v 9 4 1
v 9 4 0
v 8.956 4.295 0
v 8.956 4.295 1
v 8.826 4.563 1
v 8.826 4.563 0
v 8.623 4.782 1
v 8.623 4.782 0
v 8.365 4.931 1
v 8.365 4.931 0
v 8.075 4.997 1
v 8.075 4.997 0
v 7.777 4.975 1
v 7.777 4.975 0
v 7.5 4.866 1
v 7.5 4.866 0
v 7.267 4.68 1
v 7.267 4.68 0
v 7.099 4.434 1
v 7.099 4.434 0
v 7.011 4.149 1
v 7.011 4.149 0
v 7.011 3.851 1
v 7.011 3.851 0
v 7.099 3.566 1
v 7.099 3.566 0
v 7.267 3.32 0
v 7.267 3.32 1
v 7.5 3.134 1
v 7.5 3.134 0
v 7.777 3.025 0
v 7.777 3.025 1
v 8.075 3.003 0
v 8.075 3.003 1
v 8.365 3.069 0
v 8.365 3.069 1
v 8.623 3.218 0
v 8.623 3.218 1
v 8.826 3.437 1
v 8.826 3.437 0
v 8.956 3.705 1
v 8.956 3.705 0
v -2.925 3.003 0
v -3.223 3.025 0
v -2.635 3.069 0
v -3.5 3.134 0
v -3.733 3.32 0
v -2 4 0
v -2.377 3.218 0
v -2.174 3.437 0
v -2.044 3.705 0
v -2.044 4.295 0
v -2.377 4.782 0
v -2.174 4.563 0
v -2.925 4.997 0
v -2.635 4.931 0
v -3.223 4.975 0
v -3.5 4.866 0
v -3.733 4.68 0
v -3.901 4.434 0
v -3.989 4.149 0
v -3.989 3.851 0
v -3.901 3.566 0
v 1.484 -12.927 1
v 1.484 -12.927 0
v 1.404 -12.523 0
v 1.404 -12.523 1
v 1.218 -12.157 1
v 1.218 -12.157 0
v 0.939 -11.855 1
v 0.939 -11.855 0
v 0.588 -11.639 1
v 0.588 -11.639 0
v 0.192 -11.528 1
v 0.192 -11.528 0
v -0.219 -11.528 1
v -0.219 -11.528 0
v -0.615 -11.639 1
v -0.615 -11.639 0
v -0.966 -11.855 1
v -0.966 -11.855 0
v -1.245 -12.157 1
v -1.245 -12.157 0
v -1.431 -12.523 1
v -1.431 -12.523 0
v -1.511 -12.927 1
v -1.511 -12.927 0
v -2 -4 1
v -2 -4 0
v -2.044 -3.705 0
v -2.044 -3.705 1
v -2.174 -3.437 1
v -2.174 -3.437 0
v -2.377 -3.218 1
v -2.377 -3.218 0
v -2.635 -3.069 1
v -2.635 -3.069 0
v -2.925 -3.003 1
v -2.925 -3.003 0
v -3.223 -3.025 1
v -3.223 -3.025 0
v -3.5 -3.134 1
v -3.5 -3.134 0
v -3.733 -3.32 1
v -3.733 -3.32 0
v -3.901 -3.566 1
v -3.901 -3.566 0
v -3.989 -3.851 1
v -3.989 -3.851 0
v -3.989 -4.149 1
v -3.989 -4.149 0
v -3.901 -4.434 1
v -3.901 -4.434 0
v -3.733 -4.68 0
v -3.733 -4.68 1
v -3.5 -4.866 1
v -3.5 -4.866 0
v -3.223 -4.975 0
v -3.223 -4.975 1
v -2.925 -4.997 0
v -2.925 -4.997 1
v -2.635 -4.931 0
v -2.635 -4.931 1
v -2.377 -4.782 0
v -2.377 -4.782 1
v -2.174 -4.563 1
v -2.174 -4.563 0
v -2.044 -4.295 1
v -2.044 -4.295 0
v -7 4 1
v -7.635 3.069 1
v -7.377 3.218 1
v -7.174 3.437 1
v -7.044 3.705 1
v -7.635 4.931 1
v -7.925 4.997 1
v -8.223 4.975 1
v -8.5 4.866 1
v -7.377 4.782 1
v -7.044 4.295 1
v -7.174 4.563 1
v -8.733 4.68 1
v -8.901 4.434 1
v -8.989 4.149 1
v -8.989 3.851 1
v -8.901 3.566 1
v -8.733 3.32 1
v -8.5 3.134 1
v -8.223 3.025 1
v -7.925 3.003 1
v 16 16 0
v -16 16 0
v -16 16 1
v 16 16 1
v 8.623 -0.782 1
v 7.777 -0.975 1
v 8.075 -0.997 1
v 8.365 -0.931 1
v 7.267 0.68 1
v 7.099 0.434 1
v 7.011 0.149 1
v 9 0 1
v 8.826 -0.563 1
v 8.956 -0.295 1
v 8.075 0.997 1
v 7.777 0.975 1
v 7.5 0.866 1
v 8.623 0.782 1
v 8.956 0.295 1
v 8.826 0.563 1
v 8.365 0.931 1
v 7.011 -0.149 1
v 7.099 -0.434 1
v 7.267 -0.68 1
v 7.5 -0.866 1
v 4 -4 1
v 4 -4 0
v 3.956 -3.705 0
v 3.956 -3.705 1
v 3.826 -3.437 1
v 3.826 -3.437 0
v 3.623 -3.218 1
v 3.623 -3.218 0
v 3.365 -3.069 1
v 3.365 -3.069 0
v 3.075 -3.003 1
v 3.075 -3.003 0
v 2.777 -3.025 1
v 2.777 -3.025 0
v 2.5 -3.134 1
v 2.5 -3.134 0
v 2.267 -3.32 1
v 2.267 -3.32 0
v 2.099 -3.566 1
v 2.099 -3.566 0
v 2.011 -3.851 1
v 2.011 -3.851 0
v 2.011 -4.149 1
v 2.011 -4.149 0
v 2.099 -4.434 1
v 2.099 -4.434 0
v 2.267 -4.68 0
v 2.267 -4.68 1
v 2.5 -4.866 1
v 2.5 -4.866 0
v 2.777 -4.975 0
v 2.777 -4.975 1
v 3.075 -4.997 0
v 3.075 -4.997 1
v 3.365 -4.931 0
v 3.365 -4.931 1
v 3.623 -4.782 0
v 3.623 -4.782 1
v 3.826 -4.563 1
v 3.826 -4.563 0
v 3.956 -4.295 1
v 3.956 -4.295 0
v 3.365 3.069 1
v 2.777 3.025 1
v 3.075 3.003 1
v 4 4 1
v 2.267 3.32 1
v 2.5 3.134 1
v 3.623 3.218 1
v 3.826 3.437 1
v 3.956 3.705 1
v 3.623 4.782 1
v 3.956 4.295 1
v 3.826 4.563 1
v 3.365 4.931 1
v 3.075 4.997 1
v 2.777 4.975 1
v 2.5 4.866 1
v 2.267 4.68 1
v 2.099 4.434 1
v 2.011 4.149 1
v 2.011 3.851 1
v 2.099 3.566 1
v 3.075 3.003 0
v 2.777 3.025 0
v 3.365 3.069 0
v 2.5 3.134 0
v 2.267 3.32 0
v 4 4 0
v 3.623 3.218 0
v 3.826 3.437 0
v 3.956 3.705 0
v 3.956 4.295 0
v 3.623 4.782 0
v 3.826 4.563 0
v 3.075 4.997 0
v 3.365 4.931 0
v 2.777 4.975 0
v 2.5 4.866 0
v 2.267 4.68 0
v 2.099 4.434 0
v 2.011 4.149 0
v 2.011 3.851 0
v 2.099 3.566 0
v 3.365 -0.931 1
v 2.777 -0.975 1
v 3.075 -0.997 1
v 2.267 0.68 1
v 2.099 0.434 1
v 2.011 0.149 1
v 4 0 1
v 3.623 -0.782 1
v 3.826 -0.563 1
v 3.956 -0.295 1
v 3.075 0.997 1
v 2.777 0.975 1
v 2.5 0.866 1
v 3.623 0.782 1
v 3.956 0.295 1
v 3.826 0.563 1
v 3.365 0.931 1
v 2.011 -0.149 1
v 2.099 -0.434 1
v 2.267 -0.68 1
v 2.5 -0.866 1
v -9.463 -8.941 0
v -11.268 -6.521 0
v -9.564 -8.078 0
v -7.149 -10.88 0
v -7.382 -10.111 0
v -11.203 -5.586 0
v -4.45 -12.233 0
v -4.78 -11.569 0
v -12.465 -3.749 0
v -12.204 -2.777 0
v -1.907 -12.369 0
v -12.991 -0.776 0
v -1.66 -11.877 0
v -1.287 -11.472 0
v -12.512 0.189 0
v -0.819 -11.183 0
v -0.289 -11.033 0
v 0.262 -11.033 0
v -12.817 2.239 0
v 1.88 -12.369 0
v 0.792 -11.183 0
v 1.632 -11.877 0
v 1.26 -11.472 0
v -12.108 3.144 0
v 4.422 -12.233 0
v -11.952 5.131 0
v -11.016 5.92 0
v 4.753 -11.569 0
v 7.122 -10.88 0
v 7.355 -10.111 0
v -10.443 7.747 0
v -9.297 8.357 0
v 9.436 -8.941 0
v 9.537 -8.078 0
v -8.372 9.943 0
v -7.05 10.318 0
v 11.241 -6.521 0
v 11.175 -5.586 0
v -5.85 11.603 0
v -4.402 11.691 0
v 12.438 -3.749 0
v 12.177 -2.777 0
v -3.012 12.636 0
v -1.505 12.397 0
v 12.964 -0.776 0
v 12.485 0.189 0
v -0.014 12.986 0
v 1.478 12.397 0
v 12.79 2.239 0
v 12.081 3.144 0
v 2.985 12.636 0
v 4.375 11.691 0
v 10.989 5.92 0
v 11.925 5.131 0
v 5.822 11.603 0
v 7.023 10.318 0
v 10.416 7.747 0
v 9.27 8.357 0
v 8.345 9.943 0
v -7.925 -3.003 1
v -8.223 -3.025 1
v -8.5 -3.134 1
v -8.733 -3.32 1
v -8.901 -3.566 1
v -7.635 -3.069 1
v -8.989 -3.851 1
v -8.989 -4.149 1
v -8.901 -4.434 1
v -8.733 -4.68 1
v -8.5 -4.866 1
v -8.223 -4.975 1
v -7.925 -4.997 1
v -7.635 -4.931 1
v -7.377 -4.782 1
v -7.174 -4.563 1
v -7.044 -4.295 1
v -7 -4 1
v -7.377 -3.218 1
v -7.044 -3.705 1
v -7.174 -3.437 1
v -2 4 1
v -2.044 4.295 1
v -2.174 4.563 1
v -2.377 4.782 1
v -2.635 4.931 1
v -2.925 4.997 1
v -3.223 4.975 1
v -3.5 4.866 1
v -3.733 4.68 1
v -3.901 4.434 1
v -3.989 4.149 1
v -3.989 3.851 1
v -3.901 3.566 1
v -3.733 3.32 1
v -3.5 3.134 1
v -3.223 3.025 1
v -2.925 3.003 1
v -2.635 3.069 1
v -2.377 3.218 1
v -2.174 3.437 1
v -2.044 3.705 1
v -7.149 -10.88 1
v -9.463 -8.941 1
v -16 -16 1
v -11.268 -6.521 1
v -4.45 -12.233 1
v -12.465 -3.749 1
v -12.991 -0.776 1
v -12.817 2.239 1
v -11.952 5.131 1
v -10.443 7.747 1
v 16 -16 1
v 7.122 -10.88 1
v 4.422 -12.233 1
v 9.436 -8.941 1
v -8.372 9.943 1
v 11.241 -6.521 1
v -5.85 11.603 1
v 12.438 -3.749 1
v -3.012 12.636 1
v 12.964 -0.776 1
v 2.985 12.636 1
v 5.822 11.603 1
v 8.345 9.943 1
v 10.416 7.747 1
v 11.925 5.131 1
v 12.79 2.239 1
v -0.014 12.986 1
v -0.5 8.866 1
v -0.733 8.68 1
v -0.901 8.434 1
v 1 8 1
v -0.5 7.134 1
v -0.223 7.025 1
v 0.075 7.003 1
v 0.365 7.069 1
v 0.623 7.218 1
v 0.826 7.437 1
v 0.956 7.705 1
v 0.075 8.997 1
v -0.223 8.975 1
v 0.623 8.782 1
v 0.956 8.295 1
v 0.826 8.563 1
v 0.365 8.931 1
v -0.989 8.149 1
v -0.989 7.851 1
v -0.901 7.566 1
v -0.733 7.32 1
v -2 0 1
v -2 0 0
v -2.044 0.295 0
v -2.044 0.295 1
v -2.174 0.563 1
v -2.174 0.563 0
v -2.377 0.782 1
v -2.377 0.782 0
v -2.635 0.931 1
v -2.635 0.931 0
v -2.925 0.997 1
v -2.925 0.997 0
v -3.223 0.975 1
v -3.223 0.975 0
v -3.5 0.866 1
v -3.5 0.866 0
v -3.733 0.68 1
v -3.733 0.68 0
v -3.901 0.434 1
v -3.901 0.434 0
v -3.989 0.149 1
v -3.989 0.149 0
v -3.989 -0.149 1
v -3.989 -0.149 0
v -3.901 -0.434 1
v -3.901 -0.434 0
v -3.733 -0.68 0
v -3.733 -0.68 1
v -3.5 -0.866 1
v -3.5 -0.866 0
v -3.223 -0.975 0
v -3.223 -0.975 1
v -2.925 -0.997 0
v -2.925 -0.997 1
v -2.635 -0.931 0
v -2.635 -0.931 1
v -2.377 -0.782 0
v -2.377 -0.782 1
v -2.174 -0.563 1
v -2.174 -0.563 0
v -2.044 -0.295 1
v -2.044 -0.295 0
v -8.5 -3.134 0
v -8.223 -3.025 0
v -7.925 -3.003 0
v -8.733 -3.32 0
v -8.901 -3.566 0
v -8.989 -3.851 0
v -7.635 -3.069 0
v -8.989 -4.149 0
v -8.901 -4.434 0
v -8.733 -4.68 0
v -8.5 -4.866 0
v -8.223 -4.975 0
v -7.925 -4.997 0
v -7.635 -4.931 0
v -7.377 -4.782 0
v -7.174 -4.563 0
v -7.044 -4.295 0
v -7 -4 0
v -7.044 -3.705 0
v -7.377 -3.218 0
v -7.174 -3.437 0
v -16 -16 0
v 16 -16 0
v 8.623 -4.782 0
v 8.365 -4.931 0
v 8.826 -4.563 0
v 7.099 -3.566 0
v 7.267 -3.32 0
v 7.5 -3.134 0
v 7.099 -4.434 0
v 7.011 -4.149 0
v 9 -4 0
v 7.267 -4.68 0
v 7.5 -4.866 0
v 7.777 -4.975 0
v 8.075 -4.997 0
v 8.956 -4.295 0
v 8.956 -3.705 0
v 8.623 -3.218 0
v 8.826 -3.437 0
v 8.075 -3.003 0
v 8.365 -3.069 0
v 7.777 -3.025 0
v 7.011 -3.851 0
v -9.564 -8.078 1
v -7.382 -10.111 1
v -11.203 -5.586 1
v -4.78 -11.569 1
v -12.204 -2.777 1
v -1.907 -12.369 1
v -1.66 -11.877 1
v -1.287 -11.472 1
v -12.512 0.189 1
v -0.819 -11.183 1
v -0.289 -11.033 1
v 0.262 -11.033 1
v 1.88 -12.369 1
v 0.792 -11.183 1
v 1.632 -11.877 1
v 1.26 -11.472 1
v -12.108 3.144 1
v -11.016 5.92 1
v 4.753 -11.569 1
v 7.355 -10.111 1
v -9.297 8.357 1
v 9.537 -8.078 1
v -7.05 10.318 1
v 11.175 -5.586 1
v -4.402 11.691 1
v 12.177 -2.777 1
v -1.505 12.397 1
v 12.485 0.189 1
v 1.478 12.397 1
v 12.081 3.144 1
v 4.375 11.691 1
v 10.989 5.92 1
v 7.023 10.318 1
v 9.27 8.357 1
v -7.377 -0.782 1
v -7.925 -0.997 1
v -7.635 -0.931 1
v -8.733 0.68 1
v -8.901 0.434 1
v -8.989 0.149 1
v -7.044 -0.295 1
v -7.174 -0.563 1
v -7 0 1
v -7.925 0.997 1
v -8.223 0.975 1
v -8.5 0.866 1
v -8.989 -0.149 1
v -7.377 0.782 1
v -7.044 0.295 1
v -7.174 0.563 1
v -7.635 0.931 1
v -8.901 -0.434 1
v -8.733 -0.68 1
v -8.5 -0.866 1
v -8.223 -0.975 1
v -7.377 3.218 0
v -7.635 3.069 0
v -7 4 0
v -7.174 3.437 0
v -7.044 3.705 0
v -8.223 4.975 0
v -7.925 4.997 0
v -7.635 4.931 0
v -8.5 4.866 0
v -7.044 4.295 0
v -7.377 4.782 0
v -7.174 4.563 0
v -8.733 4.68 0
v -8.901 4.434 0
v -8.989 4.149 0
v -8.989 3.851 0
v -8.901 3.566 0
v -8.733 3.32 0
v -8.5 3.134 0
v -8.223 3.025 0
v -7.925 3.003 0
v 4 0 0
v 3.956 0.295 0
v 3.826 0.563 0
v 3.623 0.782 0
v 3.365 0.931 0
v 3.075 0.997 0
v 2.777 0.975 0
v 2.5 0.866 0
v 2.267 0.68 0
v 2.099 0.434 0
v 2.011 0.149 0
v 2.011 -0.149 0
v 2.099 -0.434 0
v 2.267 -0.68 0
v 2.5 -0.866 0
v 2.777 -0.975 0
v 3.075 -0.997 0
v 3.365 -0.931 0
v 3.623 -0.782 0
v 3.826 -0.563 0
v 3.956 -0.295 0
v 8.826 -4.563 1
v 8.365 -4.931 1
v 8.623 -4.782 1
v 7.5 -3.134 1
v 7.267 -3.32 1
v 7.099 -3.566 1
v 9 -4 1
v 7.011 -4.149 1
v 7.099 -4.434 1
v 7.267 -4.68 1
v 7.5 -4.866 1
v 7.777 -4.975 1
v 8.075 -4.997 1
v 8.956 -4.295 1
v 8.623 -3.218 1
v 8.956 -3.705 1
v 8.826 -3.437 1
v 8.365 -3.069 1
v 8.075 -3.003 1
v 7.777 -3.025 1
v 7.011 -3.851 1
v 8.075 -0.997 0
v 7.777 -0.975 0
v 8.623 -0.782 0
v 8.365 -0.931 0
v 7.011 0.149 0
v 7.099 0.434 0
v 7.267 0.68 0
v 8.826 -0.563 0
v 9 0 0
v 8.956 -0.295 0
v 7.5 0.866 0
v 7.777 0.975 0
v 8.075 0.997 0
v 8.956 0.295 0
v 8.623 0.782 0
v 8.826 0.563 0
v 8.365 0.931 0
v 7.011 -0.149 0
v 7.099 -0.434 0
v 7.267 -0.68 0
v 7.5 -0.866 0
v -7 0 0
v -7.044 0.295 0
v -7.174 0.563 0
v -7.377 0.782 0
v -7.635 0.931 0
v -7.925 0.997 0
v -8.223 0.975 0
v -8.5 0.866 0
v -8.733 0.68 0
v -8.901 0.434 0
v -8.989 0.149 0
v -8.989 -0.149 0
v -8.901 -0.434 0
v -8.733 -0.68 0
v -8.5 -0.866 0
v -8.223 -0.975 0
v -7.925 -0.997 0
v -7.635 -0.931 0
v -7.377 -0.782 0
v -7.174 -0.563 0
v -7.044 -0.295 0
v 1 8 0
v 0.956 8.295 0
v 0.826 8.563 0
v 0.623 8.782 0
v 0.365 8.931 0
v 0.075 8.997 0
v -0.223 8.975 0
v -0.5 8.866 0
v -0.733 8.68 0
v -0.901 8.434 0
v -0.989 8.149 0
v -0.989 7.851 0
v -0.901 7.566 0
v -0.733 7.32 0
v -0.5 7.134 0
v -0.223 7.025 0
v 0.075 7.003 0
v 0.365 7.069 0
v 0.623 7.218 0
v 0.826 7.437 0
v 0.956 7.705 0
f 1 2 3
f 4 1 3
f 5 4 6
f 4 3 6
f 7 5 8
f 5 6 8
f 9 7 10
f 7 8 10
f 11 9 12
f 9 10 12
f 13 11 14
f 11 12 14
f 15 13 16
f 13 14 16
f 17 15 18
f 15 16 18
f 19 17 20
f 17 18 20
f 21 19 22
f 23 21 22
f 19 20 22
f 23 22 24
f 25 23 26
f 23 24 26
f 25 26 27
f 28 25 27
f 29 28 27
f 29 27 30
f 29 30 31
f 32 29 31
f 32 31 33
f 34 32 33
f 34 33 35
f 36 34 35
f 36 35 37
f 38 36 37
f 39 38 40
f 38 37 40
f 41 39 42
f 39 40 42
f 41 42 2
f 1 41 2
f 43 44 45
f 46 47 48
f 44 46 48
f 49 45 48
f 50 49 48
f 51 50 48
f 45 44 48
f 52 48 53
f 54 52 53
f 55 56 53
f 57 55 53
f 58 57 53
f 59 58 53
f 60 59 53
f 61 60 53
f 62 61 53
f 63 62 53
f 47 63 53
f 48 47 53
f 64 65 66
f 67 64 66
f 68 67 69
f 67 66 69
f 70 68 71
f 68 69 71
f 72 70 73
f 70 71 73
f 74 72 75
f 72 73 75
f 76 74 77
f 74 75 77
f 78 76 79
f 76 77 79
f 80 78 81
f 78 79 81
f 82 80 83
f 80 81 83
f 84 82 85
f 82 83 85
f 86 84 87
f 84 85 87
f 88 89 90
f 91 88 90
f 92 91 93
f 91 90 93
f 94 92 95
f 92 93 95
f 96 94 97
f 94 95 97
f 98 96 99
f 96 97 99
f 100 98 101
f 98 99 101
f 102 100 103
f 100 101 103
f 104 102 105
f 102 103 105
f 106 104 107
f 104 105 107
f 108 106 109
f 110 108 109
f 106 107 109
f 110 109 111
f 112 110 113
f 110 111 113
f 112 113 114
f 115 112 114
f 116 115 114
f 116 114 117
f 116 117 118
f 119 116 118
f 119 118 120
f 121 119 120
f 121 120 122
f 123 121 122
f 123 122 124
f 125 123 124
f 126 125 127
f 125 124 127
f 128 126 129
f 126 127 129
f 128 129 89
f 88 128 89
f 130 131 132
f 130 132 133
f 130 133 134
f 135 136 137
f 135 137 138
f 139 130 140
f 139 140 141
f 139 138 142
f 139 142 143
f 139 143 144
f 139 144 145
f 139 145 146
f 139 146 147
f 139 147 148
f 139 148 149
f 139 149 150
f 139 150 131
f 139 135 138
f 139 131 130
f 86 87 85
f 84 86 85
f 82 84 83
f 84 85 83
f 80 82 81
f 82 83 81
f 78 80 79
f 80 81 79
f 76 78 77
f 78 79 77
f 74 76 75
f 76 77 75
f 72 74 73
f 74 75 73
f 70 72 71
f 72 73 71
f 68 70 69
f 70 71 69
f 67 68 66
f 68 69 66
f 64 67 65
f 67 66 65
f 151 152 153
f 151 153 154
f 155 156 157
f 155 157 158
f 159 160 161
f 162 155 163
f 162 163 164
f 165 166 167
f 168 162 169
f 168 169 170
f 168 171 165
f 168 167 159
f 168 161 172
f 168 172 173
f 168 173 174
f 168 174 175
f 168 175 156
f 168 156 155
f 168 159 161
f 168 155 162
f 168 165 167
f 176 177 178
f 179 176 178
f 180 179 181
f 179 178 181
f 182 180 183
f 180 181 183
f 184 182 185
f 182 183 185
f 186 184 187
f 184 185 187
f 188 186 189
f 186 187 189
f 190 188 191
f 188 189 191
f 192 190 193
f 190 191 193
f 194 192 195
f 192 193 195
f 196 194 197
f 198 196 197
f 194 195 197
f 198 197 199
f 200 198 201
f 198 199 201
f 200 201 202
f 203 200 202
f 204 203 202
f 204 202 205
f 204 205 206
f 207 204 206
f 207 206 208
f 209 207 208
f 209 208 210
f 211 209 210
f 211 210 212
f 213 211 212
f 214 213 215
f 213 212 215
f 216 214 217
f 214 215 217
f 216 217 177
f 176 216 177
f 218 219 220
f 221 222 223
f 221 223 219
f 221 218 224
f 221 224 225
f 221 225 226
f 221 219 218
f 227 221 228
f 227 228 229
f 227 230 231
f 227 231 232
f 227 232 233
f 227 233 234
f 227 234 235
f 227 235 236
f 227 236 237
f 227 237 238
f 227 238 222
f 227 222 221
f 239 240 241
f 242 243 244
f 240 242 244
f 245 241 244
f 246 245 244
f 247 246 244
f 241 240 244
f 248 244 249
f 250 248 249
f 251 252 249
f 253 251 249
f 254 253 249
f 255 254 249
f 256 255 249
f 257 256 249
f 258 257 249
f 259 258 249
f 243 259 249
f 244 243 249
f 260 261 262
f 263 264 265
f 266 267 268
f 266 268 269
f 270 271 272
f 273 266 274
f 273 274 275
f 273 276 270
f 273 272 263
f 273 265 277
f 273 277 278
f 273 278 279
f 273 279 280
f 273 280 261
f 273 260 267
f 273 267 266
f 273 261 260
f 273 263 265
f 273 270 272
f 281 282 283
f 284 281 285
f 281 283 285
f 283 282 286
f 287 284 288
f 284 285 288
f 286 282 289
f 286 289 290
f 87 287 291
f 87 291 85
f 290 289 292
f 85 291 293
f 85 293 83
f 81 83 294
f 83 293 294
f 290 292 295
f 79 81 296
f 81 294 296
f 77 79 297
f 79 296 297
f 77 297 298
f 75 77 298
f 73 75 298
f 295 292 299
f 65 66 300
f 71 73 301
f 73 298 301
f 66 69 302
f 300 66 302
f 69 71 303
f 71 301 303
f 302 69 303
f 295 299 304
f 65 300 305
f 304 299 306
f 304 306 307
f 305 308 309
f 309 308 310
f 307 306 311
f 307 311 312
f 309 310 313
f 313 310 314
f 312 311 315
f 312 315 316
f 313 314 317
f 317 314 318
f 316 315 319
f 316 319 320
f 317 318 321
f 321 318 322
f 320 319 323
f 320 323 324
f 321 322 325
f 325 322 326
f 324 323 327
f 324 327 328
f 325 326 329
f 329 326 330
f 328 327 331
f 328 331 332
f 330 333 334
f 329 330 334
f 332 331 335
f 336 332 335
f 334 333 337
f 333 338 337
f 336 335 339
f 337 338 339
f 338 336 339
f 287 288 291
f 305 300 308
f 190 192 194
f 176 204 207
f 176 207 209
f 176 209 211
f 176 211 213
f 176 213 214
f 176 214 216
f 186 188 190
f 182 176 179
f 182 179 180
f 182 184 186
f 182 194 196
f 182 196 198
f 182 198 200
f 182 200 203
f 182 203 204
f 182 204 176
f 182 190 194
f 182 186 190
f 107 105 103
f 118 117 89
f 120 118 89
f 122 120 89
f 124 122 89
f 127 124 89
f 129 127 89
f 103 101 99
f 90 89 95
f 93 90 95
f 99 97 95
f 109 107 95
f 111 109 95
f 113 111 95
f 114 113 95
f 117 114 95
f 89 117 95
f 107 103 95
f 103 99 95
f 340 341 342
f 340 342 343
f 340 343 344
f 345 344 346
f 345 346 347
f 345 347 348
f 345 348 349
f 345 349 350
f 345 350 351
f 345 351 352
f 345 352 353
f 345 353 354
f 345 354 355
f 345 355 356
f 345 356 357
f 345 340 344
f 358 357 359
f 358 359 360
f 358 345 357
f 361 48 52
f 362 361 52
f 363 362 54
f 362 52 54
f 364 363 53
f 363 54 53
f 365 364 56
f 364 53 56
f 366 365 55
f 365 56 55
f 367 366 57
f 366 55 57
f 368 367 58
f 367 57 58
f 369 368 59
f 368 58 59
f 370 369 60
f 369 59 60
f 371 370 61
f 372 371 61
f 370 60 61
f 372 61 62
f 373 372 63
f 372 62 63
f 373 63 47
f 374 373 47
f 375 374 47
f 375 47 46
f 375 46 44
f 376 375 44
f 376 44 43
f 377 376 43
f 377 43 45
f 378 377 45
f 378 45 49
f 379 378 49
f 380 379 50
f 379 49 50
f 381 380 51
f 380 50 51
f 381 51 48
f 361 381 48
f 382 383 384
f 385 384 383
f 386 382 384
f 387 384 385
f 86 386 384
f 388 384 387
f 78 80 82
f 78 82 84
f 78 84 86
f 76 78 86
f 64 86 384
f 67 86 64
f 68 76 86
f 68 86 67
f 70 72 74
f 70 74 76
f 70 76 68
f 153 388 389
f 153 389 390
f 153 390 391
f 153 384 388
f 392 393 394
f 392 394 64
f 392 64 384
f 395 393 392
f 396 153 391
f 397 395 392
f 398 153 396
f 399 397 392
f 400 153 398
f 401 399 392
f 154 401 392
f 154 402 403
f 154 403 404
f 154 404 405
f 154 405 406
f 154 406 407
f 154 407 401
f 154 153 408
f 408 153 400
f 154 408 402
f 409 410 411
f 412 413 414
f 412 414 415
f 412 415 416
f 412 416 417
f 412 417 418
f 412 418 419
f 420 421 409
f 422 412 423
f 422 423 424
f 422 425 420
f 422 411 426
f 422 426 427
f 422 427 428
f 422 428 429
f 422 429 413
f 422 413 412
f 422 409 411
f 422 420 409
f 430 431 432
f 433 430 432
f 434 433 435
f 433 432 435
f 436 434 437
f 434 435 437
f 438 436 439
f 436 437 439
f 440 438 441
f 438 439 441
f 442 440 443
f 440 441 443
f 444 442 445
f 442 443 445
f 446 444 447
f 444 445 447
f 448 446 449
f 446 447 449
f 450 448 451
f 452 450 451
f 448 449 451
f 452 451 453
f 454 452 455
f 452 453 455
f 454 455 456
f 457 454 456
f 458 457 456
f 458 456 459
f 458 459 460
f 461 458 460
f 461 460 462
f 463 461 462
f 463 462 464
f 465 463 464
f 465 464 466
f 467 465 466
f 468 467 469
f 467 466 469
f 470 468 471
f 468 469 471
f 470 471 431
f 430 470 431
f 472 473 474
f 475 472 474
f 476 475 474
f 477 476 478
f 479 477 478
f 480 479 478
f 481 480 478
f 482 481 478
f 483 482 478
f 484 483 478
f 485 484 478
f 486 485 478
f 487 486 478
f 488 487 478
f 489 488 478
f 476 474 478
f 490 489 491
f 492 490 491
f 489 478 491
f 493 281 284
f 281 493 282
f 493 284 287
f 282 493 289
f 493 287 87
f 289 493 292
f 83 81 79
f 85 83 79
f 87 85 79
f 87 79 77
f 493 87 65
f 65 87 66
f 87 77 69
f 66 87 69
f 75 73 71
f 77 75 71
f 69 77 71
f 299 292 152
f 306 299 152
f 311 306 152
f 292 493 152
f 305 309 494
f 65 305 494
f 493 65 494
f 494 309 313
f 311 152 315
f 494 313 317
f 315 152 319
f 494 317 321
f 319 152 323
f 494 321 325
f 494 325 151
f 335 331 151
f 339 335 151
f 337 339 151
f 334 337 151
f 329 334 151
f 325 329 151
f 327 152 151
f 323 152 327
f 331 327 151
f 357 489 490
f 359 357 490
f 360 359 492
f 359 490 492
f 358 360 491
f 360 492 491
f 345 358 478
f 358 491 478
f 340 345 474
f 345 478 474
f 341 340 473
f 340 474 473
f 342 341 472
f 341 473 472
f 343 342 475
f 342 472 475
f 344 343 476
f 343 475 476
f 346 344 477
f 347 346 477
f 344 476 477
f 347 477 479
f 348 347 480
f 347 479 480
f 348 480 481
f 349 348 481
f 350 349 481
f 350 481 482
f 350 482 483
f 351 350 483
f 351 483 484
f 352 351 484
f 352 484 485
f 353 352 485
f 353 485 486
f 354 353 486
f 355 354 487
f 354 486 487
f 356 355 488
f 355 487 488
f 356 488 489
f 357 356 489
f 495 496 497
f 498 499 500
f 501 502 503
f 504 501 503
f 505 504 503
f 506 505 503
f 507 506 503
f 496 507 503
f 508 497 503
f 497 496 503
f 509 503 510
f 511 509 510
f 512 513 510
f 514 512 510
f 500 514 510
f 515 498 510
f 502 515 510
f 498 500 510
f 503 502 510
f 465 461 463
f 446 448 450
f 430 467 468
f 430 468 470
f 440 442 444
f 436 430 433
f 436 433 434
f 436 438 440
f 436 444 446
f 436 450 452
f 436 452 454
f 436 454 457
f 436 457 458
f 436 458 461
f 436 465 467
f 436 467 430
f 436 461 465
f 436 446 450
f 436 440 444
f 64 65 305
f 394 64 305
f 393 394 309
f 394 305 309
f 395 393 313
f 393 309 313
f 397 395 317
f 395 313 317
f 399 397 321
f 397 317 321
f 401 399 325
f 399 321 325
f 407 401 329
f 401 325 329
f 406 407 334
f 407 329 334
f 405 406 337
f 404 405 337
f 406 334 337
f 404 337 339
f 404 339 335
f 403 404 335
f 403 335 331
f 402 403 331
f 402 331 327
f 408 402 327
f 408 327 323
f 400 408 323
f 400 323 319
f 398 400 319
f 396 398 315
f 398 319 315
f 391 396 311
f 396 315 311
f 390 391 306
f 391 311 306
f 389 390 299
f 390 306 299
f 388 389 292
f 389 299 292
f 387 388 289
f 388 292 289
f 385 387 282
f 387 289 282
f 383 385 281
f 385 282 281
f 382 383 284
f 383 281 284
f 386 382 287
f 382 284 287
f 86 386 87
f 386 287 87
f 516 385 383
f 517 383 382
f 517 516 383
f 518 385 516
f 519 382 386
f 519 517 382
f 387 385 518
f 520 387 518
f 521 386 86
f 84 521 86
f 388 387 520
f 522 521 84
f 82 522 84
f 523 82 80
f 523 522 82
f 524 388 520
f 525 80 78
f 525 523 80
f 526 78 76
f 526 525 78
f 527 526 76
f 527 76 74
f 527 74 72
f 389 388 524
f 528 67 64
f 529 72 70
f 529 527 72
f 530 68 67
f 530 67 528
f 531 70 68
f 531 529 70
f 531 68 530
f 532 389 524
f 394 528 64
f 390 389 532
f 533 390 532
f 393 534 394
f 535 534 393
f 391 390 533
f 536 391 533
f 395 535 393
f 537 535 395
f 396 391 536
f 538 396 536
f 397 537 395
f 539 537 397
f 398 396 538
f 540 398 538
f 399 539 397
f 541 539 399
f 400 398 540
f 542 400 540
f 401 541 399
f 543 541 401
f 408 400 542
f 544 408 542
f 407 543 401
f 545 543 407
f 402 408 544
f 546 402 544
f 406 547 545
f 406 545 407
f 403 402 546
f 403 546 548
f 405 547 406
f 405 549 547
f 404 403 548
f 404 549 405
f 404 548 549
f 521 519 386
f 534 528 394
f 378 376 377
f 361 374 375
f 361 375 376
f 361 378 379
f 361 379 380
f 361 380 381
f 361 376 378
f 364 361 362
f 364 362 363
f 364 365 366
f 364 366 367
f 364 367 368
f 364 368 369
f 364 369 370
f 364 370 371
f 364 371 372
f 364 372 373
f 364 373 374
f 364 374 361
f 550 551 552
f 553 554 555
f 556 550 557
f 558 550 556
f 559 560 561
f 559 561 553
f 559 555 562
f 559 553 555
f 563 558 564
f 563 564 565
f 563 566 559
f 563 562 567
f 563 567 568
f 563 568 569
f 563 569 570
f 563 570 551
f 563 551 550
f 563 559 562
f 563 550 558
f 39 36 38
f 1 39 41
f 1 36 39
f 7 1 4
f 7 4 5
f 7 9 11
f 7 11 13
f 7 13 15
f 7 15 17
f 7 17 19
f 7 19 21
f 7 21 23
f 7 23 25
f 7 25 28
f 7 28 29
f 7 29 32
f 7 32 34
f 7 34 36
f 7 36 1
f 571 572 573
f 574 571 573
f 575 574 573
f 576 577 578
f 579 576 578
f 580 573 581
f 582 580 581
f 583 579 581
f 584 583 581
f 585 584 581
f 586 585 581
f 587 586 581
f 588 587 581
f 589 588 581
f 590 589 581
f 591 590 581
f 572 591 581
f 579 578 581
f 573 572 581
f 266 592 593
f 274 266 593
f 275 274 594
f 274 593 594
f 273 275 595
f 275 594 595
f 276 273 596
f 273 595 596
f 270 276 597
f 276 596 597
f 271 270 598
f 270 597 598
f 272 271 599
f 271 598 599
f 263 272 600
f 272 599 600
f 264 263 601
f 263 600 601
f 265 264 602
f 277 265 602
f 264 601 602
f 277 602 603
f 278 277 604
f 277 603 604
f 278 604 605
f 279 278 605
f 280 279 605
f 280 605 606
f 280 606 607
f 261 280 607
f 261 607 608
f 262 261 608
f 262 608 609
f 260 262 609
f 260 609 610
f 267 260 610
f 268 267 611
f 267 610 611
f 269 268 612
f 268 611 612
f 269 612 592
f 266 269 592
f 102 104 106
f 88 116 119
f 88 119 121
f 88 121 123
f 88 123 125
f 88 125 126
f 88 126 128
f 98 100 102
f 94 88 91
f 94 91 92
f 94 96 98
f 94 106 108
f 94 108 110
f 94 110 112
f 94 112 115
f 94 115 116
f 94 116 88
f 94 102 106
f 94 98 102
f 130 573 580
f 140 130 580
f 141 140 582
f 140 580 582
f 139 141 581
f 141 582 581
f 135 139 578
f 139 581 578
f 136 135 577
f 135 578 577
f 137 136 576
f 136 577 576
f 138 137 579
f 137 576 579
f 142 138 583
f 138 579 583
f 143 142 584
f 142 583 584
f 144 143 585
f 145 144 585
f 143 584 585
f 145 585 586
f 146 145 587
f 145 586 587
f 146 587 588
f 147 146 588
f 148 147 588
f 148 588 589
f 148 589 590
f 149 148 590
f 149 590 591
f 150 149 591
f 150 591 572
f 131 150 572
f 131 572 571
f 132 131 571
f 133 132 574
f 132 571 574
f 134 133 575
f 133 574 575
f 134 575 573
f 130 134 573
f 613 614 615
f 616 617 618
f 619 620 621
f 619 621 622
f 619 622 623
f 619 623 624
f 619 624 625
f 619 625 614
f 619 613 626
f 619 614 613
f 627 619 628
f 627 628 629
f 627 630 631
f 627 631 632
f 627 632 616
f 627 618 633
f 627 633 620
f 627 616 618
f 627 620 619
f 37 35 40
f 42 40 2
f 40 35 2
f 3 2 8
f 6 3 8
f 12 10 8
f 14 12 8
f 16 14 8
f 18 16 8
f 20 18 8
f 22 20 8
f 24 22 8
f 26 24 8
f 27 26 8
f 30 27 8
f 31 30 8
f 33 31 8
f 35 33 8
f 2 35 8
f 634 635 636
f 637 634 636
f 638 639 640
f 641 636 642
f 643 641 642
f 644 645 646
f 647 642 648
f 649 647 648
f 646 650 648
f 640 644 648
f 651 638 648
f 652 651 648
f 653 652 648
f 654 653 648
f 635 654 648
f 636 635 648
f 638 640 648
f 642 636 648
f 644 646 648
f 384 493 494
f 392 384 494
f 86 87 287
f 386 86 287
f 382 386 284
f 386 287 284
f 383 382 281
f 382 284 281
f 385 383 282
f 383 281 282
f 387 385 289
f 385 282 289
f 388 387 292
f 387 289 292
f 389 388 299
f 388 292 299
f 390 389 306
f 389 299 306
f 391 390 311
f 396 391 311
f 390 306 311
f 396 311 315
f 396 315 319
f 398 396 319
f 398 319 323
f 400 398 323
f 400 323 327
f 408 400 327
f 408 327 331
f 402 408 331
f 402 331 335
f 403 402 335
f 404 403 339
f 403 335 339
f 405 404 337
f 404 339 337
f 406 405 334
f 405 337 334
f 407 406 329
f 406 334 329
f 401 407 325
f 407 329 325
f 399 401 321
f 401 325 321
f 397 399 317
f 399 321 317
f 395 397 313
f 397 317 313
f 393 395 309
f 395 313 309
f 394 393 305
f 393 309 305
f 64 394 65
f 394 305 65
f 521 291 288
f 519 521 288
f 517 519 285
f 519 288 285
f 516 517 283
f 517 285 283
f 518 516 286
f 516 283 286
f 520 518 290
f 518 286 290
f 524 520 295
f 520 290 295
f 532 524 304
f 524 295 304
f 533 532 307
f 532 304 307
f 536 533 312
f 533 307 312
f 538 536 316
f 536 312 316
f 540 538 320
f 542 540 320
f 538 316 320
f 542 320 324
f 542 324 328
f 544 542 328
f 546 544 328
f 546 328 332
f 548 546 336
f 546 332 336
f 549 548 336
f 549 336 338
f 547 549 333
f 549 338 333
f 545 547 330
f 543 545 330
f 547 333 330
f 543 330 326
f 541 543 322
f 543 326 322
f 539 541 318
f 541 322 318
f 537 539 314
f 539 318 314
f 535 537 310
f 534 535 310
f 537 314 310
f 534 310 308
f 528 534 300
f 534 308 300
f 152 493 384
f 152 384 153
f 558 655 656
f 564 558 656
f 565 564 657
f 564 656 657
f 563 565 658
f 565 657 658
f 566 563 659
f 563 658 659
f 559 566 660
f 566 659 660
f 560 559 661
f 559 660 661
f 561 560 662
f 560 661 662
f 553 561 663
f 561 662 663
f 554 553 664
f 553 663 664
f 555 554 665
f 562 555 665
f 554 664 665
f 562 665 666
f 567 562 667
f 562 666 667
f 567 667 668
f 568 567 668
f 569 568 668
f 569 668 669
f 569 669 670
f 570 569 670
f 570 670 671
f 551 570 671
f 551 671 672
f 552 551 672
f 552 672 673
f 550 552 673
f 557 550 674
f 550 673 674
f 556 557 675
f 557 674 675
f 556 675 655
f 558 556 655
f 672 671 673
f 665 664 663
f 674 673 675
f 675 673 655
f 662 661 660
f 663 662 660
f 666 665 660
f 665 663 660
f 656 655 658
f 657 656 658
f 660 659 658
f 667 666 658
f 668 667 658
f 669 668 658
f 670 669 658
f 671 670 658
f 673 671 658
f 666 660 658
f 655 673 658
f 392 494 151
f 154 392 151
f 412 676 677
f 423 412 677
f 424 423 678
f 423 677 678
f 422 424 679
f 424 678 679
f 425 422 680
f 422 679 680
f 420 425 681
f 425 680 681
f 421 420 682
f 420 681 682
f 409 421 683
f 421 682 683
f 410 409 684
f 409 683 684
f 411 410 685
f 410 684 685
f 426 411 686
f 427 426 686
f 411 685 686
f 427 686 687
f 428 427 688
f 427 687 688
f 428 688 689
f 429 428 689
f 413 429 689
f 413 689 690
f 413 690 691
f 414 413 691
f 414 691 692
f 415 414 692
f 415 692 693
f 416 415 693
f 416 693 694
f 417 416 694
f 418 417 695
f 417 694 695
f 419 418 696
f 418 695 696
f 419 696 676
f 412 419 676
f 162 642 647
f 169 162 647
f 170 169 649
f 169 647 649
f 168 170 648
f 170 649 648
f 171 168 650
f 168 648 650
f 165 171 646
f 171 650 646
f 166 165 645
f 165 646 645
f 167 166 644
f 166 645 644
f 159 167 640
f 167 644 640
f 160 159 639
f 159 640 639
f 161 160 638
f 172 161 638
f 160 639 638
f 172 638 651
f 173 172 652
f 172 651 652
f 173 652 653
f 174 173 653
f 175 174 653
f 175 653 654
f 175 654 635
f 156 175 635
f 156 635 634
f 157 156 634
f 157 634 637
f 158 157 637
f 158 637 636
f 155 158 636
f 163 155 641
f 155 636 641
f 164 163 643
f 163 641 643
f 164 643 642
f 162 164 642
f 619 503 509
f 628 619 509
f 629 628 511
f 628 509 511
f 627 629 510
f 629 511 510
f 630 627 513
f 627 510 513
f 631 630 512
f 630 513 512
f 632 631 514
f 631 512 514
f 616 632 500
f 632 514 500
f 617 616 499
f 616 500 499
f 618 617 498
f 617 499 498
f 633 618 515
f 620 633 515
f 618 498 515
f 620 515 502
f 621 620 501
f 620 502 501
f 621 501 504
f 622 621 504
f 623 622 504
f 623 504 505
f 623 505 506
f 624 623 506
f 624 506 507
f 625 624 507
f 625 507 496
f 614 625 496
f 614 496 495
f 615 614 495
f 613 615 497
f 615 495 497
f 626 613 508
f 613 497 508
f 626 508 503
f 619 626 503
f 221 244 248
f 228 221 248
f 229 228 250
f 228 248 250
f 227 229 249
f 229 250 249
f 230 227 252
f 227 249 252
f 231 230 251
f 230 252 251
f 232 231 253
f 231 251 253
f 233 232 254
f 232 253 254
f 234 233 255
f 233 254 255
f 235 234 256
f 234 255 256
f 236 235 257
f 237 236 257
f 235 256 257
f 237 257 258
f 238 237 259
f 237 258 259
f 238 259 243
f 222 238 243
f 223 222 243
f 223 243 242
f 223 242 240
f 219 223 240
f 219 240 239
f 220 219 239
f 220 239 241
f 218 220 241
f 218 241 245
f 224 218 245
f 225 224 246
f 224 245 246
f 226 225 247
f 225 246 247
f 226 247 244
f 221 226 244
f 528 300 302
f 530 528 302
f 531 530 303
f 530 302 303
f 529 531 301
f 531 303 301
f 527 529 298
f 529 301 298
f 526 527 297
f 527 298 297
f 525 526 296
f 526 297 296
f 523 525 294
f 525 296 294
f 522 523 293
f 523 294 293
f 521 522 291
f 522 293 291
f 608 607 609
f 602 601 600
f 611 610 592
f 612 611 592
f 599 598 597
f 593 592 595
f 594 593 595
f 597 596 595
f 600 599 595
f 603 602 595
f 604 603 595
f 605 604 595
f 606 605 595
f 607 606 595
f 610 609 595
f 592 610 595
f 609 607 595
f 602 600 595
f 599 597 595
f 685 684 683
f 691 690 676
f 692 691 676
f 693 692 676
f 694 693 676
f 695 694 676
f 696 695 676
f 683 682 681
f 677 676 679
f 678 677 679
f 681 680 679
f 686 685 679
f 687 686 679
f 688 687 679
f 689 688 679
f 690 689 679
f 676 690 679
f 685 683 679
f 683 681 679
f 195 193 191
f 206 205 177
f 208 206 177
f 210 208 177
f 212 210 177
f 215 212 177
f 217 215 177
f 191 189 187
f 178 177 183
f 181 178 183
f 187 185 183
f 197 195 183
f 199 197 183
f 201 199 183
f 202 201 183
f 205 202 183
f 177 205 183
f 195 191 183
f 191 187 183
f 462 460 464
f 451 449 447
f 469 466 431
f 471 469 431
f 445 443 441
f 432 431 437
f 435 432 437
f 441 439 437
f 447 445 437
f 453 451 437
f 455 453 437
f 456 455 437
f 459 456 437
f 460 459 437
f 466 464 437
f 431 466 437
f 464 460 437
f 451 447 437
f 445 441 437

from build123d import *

# Parameters (mm, degrees)
F1_DEPTH = 1
F0_R     = 1
F0_W     = 32
F0_H     = 32
F2_DEPTH = 1


# Not quite as in the source:
# - a feature names something its author has since deleted; it is built from what else it names


with BuildPart() as f1:
    # F0 (on Top) → F1 (new body)
    with BuildSketch(Plane.XY):
        with BuildLine():
            ThreePointArc((-1.5110484064, -12.9270083272), (-0.0135467888, -11.5135467888), (1.4839548288, -12.9270083272))
            ThreePointArc((1.4839548288, -12.9270083272), (-0.0135467888, 12.9864532112), (-1.5110484064, -12.9270083272))
        make_face()
        with BuildLine():
            ThreePointArc((-1.9069476222, -12.3693160195), (-0.0135467888, 12.4864532112), (1.8798540446, -12.3693160195))
            ThreePointArc((1.8798540446, -12.3693160195), (-0.0135467888, -11.0135467888), (-1.9069476222, -12.3693160195))
        make_face(mode=Mode.SUBTRACT)
    extrude(amount=F1_DEPTH)


with BuildPart() as f1b:
    # F0 (on Top) → F1, piece 2 (new body)
    with BuildSketch(Plane.XY):
        with Locations((-8, 4)):
            Circle(F0_R)
    extrude(amount=F1_DEPTH)


with BuildPart() as f1c:
    # F0 (on Top) → F1, piece 3 (new body)
    with BuildSketch(Plane.XY):
        with Locations((-3, 4)):
            Circle(F0_R)
    extrude(amount=F1_DEPTH)


with BuildPart() as f1d:
    # F0 (on Top) → F1, piece 4 (new body)
    with BuildSketch(Plane.XY):
        with Locations((0, 8)):
            Circle(F0_R)
    extrude(amount=F1_DEPTH)


with BuildPart() as f1e:
    # F0 (on Top) → F1, piece 5 (new body)
    with BuildSketch(Plane.XY):
        with Locations((3, 4)):
            Circle(F0_R)
    extrude(amount=F1_DEPTH)


with BuildPart() as f1f:
    # F0 (on Top) → F1, piece 6 (new body)
    with BuildSketch(Plane.XY):
        with Locations((8, 4)):
            Circle(F0_R)
    extrude(amount=F1_DEPTH)


with BuildPart() as f1g:
    # F0 (on Top) → F1, piece 7 (new body)
    with BuildSketch(Plane.XY):
        with Locations((8, 0)):
            Circle(F0_R)
    extrude(amount=F1_DEPTH)


with BuildPart() as f1h:
    # F0 (on Top) → F1, piece 8 (new body)
    with BuildSketch(Plane.XY):
        with Locations((8, -4)):
            Circle(F0_R)
    extrude(amount=F1_DEPTH)


with BuildPart() as f1i:
    # F0 (on Top) → F1, piece 9 (new body)
    with BuildSketch(Plane.XY):
        with Locations((3, -4)):
            Circle(F0_R)
    extrude(amount=F1_DEPTH)


with BuildPart() as f1j:
    # F0 (on Top) → F1, piece 10 (new body)
    with BuildSketch(Plane.XY):
        with Locations((3, 0)):
            Circle(F0_R)
    extrude(amount=F1_DEPTH)


with BuildPart() as f1k:
    # F0 (on Top) → F1, piece 11 (new body)
    with BuildSketch(Plane.XY):
        with Locations((-3, 0)):
            Circle(F0_R)
    extrude(amount=F1_DEPTH)


with BuildPart() as f1l:
    # F0 (on Top) → F1, piece 12 (new body)
    with BuildSketch(Plane.XY):
        with Locations((-3, -4)):
            Circle(F0_R)
    extrude(amount=F1_DEPTH)


with BuildPart() as f1m:
    # F0 (on Top) → F1, piece 13 (new body)
    with BuildSketch(Plane.XY):
        with Locations((-8, -4)):
            Circle(F0_R)
    extrude(amount=F1_DEPTH)


with BuildPart() as f1n:
    # F0 (on Top) → F1, piece 14 (new body)
    with BuildSketch(Plane.XY):
        with Locations((-8, 0)):
            Circle(F0_R)
    extrude(amount=F1_DEPTH)


with BuildPart() as f2:
    # F0 (on Top) → F2 (new body)
    with BuildSketch(Plane.XY):
        Rectangle(F0_W, F0_H)
        with BuildLine():
            ThreePointArc((-1.5110484064, -12.9270083272), (-0.0135467888, 12.9864532112), (1.4839548288, -12.9270083272))
            ThreePointArc((1.4839548288, -12.9270083272), (-0.0135467888, -11.5135467888), (-1.5110484064, -12.9270083272))
        make_face(mode=Mode.SUBTRACT)
    extrude(amount=F2_DEPTH)


solid = Compound([f1.part, f1b.part, f1c.part, f1d.part, f1e.part, f1f.part, f1g.part, f1h.part, f1i.part, f1j.part, f1k.part, f1l.part, f1m.part, f1n.part, f2.part])
